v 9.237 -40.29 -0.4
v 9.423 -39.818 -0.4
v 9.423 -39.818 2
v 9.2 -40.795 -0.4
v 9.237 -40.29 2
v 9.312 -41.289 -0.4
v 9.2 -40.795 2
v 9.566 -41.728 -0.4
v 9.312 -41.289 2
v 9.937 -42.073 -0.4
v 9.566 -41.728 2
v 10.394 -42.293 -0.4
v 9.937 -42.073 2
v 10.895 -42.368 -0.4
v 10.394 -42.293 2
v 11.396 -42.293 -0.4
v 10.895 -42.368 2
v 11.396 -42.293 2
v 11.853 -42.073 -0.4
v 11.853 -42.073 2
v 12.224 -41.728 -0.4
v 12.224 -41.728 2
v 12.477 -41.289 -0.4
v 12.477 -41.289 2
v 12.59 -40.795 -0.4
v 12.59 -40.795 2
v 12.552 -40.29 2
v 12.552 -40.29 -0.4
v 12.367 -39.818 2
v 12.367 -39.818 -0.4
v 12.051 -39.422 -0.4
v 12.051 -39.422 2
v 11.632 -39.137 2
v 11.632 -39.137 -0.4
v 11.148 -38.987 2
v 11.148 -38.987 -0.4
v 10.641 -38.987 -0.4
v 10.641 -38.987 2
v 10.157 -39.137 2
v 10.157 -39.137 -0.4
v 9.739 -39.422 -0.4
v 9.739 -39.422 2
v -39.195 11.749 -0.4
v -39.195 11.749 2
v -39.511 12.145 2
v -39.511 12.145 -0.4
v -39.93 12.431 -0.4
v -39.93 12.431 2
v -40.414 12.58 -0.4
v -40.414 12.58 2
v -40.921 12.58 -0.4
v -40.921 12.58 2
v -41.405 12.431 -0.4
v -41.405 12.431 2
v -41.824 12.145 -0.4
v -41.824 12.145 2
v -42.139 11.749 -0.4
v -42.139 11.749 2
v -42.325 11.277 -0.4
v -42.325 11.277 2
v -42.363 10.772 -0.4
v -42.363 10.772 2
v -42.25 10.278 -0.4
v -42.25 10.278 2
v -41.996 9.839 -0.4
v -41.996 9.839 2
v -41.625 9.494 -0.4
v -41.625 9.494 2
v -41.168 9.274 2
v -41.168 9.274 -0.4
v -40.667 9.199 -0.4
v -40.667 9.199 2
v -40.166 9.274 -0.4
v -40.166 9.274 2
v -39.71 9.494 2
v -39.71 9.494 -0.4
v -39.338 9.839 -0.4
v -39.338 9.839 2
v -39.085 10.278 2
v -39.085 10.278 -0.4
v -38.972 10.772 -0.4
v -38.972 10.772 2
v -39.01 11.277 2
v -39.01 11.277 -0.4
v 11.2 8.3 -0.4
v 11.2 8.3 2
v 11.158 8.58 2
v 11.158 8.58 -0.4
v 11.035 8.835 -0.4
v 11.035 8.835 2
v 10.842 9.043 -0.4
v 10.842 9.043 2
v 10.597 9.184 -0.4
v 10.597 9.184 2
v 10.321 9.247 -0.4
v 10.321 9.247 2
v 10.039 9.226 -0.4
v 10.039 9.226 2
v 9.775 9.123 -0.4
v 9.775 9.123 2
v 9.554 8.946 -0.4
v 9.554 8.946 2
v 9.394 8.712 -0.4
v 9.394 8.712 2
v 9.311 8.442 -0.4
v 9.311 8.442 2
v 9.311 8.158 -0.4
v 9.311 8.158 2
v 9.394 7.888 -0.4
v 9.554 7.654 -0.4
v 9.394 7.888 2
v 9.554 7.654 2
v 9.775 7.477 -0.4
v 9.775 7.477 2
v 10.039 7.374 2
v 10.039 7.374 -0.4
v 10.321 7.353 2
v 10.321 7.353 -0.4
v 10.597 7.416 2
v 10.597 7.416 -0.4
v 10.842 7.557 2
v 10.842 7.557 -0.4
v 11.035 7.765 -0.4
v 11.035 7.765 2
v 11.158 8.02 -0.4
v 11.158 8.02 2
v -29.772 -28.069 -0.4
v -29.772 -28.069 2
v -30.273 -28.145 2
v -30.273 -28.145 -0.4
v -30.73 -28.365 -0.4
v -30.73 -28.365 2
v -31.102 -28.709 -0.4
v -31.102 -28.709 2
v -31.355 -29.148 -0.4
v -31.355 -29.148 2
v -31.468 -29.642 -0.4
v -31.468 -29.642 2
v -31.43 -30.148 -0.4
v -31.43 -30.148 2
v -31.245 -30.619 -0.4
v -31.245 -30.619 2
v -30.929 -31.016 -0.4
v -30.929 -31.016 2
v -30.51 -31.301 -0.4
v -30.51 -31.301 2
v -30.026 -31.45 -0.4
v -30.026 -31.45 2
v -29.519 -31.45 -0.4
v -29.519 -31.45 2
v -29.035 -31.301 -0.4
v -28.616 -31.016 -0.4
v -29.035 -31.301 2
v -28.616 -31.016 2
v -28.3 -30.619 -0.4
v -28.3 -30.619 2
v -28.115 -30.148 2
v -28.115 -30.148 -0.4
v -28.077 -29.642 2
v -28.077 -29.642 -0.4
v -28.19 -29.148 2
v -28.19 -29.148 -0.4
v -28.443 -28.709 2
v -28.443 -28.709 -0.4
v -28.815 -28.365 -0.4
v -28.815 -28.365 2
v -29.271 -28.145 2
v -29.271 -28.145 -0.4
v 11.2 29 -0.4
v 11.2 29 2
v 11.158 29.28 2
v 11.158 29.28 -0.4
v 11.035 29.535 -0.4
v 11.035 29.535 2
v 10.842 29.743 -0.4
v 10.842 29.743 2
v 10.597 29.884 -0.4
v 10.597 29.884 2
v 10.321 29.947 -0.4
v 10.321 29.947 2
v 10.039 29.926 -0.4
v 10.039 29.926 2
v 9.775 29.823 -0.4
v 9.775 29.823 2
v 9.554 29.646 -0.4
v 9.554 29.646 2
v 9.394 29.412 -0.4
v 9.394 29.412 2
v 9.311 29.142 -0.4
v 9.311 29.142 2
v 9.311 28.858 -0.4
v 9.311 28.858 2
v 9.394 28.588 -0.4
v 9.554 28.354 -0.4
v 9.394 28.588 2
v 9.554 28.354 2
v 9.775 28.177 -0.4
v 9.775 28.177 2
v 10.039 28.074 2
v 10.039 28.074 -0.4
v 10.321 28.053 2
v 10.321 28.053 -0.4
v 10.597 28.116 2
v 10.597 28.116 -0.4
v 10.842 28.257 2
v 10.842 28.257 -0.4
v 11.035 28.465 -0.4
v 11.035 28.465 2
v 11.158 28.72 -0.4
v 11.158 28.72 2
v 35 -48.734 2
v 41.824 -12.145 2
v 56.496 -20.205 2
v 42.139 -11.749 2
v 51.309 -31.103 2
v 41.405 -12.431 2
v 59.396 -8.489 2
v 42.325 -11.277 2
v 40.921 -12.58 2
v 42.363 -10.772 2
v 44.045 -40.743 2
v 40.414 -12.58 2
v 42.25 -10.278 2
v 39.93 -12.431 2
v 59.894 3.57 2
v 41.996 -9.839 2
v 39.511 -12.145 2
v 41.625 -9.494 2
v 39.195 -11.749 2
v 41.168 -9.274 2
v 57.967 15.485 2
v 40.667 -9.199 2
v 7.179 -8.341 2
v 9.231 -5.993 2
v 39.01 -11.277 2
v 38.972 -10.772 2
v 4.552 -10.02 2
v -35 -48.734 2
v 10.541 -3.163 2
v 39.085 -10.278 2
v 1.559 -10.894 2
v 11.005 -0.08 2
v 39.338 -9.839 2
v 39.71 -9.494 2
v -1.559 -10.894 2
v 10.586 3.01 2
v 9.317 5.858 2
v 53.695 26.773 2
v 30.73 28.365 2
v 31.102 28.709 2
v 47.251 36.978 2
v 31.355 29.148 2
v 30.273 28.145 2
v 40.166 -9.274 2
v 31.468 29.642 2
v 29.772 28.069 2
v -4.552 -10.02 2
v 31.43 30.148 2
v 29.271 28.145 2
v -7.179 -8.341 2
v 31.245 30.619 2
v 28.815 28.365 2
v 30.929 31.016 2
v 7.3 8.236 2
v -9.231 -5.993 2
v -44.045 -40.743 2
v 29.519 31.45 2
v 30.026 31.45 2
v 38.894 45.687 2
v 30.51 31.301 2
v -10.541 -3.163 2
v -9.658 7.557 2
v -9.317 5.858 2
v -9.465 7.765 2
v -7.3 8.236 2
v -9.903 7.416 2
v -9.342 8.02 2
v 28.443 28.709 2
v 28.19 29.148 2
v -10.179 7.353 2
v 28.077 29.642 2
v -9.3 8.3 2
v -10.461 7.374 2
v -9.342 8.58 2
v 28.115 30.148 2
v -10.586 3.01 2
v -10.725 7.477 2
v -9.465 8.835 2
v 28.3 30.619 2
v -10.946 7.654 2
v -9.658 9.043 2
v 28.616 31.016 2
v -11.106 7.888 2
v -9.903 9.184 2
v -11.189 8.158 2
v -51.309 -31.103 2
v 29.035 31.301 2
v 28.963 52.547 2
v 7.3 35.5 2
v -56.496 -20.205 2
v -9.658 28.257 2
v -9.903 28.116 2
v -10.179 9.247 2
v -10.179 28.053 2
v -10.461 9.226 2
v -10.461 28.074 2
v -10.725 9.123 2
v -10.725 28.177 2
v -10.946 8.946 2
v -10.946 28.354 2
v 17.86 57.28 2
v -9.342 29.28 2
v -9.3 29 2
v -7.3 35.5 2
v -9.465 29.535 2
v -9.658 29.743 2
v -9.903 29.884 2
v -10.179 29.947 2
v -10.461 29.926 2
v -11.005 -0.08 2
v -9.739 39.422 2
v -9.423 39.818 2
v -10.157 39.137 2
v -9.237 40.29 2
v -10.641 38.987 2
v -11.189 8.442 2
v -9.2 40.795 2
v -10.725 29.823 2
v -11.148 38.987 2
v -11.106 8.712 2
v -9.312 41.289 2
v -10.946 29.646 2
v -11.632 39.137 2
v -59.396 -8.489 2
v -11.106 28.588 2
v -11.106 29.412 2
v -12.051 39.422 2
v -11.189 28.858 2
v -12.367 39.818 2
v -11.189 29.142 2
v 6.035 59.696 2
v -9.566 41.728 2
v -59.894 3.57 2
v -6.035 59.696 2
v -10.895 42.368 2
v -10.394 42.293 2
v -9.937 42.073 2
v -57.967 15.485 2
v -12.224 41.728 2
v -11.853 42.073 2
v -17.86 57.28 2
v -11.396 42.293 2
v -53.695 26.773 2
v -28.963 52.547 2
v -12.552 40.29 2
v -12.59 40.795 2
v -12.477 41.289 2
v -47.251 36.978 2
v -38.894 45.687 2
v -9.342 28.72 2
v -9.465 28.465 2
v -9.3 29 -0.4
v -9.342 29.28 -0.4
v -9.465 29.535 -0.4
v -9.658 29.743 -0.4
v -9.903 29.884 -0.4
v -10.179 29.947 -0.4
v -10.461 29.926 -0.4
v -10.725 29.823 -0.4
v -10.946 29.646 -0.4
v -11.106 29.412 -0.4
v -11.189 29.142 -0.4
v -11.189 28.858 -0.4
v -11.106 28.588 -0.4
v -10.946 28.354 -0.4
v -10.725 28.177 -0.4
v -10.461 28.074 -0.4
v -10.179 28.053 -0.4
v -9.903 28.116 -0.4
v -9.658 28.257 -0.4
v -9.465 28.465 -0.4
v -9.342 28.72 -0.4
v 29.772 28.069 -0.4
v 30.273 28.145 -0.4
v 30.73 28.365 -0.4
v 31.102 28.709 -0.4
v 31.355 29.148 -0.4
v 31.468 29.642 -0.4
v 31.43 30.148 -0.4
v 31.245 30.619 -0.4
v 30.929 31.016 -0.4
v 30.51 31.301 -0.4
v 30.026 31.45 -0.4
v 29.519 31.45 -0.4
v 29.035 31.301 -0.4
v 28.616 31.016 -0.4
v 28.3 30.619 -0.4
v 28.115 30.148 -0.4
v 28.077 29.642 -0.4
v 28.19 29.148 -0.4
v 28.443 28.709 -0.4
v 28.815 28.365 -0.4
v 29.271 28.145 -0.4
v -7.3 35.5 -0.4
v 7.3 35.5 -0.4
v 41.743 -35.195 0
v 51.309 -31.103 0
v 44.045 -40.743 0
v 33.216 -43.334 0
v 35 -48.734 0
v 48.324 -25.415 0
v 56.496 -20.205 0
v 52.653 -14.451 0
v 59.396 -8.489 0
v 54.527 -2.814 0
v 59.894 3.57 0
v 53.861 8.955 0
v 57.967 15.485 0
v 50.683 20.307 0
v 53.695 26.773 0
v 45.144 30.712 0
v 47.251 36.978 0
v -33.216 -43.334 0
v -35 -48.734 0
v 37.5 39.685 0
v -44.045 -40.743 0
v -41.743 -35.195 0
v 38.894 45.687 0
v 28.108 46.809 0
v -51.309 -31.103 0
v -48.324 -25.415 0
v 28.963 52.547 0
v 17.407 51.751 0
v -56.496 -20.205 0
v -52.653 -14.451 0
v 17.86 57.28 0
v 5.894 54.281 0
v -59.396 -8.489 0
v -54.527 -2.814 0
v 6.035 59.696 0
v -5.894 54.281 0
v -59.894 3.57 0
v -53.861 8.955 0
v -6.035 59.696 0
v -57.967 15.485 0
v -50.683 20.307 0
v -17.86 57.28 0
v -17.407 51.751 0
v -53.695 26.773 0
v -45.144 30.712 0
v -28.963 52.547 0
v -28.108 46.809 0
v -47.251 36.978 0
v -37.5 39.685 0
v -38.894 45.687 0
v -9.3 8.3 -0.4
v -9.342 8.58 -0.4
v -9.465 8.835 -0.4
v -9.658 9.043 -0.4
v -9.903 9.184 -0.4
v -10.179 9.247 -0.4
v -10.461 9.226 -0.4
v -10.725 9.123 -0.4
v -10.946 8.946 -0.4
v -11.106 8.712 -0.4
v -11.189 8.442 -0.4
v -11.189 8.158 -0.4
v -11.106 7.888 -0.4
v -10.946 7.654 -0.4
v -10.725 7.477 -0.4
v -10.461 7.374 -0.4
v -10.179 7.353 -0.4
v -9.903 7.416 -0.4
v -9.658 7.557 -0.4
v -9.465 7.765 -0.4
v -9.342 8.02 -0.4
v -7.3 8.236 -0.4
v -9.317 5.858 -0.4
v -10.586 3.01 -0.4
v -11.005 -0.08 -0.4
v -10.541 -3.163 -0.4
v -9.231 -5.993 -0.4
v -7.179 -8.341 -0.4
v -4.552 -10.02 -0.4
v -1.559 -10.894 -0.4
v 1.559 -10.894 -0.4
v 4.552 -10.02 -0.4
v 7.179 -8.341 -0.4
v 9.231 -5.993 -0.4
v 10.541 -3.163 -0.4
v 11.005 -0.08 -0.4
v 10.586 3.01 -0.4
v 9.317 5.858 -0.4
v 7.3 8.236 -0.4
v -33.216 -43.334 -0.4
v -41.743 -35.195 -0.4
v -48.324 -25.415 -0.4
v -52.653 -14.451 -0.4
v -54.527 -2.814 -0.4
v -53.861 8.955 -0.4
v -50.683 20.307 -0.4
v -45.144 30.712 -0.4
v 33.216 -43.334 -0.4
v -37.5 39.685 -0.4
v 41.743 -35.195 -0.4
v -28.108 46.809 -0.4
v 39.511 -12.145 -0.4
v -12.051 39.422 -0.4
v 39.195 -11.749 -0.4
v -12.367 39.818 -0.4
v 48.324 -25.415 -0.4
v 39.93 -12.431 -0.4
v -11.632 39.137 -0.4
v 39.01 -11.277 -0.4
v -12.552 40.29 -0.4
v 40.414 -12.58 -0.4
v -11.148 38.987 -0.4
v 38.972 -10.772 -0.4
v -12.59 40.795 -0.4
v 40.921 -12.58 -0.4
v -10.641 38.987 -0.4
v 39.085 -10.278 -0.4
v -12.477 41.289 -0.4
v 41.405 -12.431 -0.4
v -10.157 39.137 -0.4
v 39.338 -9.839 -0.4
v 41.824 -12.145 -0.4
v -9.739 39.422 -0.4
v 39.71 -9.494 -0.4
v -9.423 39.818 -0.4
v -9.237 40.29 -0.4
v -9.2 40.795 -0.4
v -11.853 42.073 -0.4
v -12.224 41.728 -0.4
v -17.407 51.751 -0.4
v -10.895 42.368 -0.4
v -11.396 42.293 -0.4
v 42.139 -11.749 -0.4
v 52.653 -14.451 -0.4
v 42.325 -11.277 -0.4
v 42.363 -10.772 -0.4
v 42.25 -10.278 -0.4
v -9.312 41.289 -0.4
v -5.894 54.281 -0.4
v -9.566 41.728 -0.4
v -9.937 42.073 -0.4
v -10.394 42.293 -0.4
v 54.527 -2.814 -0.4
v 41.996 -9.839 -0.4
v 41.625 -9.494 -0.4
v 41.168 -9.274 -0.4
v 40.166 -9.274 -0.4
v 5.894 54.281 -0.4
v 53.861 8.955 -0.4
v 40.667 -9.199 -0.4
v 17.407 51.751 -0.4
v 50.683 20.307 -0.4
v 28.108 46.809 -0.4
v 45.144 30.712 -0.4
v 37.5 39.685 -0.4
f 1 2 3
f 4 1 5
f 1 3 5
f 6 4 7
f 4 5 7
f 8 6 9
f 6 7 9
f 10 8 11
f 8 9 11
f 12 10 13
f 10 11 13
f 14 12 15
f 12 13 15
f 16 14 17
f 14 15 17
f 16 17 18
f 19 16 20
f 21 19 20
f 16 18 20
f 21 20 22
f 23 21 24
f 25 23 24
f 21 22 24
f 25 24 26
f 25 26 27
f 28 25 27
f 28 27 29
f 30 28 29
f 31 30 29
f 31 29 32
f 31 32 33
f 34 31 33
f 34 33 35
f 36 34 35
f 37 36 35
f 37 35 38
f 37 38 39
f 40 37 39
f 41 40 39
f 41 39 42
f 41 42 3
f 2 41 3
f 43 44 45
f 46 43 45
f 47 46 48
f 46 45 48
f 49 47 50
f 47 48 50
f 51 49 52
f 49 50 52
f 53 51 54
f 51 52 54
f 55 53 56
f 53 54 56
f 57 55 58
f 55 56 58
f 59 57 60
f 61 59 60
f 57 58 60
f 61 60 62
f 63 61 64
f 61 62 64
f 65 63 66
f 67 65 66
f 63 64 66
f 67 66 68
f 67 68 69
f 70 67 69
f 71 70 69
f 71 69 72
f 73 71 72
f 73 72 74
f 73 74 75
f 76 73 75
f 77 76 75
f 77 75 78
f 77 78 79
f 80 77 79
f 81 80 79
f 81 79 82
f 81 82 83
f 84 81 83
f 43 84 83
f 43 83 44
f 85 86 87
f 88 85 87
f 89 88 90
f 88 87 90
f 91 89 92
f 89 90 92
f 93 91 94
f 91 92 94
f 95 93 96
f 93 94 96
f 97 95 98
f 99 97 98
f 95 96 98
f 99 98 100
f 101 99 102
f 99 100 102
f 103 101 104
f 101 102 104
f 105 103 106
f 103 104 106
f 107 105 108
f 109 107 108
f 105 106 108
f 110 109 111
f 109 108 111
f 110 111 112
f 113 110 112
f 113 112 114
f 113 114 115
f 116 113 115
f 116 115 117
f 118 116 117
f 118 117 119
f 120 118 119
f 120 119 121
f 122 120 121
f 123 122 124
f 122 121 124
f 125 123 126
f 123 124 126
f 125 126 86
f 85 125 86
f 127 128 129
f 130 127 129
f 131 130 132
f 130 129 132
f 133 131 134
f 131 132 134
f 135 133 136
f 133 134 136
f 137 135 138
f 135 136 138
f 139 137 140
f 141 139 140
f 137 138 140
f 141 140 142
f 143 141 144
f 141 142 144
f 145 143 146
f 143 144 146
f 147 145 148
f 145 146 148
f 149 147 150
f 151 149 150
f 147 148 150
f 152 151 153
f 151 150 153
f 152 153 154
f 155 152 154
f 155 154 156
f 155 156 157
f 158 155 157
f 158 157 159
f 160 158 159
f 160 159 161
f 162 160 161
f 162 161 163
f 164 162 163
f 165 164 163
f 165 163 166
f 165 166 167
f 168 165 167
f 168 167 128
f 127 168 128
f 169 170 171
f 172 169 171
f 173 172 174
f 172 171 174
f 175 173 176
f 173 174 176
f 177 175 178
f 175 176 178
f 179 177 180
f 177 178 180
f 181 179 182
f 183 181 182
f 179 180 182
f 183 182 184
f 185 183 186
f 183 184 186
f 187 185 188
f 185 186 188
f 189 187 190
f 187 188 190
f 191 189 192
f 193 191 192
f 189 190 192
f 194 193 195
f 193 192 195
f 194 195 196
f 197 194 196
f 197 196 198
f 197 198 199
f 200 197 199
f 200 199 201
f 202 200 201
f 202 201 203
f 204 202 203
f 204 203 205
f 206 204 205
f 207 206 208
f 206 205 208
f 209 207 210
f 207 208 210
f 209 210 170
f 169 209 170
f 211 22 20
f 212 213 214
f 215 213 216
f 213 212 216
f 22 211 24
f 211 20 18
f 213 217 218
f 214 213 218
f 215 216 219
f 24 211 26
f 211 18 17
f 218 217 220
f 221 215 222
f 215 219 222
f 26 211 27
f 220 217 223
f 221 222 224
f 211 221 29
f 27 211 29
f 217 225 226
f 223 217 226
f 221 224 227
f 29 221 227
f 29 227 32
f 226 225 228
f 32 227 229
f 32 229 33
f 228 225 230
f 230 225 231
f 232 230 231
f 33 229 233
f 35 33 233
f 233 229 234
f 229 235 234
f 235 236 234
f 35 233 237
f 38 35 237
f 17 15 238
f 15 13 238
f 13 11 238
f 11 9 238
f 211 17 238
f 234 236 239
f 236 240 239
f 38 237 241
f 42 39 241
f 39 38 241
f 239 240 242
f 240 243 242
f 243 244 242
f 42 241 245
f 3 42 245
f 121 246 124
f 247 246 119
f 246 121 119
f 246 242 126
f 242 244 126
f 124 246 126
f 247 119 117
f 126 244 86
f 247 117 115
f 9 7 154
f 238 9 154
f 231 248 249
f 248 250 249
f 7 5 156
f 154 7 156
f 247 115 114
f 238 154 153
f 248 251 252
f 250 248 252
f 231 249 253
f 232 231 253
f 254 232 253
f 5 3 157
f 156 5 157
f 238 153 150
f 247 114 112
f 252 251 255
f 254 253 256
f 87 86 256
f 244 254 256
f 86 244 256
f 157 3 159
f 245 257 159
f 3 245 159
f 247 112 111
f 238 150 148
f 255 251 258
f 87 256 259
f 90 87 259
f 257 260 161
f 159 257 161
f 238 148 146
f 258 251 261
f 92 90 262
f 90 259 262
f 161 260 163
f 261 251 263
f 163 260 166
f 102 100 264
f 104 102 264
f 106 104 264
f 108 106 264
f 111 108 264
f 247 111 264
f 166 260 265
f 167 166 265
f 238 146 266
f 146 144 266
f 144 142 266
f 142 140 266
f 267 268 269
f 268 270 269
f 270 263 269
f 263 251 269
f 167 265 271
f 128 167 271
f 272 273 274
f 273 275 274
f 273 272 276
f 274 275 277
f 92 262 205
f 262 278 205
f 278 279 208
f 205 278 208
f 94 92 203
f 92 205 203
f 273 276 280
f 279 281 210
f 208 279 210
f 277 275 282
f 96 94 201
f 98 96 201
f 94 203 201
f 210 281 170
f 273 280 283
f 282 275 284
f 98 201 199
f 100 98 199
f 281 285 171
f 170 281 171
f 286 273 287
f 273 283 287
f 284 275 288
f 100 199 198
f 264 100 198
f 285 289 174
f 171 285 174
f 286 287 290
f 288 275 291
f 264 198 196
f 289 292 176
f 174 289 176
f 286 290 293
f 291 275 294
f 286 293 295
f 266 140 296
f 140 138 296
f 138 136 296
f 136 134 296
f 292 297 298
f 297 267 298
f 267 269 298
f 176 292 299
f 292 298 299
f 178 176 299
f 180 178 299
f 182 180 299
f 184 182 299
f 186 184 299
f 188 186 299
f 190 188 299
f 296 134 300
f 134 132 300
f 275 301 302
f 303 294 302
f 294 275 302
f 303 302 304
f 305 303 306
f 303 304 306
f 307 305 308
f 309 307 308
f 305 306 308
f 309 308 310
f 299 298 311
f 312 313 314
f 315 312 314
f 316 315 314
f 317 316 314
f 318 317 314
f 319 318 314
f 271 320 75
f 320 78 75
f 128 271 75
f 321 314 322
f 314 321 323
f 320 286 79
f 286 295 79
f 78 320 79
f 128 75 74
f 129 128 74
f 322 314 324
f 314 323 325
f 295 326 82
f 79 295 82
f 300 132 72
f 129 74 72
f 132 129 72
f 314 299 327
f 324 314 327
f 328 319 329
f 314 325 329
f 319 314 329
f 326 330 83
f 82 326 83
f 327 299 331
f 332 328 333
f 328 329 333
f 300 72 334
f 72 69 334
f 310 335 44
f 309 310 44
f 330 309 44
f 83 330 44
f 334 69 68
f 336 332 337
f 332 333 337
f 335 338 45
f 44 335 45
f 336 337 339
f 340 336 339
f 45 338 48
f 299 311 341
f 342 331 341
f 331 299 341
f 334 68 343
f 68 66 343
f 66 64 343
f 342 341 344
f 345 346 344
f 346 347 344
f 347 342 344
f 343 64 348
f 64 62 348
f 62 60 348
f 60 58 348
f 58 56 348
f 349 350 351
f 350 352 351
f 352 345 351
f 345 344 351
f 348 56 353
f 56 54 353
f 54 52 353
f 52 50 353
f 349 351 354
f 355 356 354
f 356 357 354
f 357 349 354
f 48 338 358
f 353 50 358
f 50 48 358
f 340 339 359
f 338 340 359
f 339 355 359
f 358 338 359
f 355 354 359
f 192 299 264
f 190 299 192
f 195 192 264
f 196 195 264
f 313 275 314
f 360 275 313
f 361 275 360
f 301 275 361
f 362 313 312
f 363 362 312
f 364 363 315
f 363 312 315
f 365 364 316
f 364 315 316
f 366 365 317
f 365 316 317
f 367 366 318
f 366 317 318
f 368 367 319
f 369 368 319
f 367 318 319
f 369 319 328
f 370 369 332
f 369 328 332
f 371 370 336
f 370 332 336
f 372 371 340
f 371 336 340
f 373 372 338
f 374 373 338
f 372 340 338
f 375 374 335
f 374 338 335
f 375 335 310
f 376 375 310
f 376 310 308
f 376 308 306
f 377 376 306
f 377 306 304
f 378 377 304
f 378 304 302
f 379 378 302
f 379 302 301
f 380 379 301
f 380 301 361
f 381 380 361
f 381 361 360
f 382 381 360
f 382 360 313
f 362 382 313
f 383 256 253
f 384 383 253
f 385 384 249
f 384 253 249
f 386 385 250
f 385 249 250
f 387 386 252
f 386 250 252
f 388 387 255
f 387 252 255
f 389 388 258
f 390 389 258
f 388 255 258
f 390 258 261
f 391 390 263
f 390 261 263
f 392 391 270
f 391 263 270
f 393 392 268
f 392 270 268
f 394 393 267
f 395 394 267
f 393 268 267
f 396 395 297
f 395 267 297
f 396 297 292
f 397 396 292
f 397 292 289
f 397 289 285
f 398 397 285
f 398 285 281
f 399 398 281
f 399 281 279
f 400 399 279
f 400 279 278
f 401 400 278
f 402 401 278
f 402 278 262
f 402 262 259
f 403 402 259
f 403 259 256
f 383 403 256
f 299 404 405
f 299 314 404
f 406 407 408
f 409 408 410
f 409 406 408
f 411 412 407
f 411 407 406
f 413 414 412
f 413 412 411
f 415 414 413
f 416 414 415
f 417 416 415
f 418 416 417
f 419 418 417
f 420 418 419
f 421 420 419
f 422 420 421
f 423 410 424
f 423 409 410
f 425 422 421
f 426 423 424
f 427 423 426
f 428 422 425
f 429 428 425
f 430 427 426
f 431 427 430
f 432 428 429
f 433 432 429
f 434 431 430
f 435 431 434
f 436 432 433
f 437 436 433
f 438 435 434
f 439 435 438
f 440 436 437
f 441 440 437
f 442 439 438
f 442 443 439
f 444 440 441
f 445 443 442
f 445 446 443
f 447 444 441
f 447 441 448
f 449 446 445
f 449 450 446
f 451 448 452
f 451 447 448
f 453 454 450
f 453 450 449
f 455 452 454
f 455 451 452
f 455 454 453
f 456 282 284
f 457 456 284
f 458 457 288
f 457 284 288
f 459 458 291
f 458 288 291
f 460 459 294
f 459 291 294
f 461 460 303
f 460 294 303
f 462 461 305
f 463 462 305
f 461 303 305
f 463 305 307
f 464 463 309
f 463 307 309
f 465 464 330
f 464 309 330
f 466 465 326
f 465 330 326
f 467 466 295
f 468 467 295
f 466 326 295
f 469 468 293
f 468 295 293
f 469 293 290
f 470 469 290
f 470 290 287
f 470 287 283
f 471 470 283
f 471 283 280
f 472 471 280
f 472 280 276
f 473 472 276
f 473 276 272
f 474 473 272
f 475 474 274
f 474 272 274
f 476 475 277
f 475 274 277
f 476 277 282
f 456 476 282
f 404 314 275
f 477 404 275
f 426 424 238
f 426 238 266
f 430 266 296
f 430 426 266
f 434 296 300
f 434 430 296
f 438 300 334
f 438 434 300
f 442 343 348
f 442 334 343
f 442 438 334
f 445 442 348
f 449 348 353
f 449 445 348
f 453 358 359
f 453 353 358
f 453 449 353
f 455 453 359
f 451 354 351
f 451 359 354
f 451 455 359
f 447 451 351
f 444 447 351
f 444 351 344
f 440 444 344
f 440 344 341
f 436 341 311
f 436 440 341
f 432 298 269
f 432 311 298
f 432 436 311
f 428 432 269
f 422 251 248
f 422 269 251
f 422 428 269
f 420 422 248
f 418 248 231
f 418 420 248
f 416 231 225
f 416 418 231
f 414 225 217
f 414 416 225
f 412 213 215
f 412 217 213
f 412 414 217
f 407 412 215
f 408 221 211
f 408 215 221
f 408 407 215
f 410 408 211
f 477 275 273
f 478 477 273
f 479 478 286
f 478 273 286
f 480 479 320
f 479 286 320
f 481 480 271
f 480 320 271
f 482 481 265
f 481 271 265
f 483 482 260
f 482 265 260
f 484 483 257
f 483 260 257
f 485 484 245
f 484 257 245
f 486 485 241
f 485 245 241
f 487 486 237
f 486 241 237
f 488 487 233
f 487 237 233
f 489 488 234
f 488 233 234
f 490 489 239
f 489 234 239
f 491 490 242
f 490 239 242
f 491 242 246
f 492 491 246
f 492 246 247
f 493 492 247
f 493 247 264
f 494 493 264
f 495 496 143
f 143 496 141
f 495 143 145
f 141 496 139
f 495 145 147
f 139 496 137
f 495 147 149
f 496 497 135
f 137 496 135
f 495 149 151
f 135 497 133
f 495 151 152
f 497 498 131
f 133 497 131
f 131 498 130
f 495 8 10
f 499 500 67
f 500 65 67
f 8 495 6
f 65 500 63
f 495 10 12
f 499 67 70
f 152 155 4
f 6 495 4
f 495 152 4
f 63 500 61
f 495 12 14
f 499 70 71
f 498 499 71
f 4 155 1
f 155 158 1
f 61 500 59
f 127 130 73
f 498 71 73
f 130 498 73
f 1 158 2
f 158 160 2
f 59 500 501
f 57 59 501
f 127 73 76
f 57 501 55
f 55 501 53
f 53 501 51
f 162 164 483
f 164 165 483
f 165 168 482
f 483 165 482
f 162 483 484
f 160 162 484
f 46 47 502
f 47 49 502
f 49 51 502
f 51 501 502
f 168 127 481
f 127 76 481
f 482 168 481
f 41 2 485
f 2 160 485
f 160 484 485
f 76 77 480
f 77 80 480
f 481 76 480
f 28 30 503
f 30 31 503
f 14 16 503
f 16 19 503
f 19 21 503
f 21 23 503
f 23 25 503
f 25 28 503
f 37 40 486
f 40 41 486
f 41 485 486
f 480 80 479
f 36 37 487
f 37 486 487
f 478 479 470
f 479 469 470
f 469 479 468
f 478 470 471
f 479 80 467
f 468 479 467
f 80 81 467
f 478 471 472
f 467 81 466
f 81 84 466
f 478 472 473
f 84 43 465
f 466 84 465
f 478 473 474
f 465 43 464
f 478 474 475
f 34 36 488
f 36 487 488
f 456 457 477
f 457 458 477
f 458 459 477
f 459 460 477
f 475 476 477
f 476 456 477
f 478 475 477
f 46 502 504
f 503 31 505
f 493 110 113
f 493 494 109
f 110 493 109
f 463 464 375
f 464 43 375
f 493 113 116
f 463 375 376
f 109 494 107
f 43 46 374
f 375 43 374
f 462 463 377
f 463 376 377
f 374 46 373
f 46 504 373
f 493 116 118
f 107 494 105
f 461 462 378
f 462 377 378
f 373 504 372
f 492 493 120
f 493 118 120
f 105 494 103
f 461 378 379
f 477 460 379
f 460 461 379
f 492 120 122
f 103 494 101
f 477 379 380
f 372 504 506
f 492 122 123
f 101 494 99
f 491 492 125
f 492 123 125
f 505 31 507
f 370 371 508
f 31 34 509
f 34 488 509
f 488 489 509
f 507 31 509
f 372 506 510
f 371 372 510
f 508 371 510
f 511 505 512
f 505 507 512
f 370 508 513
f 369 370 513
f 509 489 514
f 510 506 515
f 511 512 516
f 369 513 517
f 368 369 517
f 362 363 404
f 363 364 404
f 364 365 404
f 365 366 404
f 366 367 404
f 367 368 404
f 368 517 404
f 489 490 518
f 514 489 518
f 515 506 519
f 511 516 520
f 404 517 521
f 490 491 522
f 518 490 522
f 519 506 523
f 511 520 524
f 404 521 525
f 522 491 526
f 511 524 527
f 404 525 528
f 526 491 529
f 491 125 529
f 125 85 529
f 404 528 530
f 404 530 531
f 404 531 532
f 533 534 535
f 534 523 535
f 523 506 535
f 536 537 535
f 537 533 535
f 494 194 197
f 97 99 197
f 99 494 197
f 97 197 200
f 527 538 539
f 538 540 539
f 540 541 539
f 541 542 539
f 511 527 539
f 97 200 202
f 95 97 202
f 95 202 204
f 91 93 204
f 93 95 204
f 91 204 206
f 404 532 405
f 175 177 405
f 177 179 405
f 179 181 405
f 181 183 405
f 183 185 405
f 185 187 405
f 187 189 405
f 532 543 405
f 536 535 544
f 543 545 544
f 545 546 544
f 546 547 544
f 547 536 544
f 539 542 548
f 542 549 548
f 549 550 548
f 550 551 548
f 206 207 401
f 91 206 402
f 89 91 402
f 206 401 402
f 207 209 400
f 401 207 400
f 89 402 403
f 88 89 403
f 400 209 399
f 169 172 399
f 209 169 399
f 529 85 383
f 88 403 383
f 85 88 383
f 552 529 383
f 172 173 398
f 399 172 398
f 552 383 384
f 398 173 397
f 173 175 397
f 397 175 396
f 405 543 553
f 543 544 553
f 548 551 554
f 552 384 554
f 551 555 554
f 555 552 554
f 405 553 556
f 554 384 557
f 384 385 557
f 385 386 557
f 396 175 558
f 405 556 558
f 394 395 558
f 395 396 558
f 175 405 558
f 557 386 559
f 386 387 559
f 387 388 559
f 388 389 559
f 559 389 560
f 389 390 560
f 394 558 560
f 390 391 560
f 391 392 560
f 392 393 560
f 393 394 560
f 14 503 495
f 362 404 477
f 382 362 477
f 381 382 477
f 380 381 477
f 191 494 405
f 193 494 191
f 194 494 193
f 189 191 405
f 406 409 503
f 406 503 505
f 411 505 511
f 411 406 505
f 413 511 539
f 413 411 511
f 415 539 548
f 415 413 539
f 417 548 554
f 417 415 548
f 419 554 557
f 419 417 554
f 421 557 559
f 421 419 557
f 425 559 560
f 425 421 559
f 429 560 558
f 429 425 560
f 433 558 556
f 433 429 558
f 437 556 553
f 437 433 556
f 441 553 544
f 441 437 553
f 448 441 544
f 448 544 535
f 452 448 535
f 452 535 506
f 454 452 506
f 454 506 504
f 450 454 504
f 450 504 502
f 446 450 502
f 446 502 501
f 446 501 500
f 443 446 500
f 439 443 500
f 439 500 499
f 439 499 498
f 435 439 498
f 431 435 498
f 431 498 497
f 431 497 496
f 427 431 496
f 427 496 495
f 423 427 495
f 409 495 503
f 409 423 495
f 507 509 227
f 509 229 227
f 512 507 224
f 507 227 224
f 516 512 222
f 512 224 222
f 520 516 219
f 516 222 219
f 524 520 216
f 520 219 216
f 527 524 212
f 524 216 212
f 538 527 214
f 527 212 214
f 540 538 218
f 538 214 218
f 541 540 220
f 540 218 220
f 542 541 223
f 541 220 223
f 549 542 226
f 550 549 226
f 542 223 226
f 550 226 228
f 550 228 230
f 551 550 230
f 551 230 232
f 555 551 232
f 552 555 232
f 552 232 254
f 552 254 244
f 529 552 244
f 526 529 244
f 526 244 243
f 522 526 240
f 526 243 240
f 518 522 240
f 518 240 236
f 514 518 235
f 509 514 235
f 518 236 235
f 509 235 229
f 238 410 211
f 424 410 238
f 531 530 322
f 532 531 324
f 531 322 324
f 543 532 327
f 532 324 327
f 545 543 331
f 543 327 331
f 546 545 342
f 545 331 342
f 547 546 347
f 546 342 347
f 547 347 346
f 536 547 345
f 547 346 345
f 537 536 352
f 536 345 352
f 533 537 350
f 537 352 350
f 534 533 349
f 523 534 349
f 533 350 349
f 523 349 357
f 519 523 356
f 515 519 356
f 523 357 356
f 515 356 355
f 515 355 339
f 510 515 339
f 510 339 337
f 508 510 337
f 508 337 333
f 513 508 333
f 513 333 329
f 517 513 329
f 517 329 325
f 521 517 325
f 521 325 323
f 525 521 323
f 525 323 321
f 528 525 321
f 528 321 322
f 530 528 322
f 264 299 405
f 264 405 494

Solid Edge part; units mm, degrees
sketch "Sketch1" plane through (0, 0, 0) normal (0, 0, 1) x (1, 0, 0)
  line L0 (-33.2164, -43.334) -> (33.2164, -43.334)
  arc A0 (33.2164, -43.334) -> (-33.2164, -43.334) centre (0, 0) ccw
extrude "Protrusion1" add sketch "Sketch1" against normal blind 0.4
sketch "Sketch2" plane through (0, 9.1432, 0) normal (0, 0, 1) x (-1, 0, 0)
  line L0 (-35, 57.8772) -> (35, 57.8772)
  arc A0 (-35, 57.8772) -> (35, 57.8772) centre (0, 9.1432) ccw
extrude "Protrusion2" add sketch "Sketch2" along normal blind 2
sketch "Sketch3" plane through (0, 8.1307, 2) normal (0, 0, 1) x (1, 0, 0)
  line L0 (-7.3, 27.3693) -> (7.3, 27.3693)
  line L1 (7.3, 27.3693) -> (7.3, 0.105)
  arc A0 (-7.3, 0.105) -> (7.3, 0.105) centre (0, -8.1307) ccw
  line L2 (-7.3, 27.3693) -> (-7.3, 0.105)
  circle A1 centre (10.25, 0.1693) radius 0.95
  circle A2 centre (10.25, 20.8693) radius 0.95
  circle A3 centre (-10.25, 20.8693) radius 0.95
  circle A4 centre (-10.25, 0.1693) radius 0.95
extrude "Cutout1" cut sketch "Sketch3" against normal through all
hole "Hole1" at (29.7724, 29.7694, 2) direction (0, 0, -1) diameter 3.4 end up to next
pattern_circular "Pattern1" count 6 over 360 about axis through (0, 0, 2) along (0, 0, -1) of "Hole1"
